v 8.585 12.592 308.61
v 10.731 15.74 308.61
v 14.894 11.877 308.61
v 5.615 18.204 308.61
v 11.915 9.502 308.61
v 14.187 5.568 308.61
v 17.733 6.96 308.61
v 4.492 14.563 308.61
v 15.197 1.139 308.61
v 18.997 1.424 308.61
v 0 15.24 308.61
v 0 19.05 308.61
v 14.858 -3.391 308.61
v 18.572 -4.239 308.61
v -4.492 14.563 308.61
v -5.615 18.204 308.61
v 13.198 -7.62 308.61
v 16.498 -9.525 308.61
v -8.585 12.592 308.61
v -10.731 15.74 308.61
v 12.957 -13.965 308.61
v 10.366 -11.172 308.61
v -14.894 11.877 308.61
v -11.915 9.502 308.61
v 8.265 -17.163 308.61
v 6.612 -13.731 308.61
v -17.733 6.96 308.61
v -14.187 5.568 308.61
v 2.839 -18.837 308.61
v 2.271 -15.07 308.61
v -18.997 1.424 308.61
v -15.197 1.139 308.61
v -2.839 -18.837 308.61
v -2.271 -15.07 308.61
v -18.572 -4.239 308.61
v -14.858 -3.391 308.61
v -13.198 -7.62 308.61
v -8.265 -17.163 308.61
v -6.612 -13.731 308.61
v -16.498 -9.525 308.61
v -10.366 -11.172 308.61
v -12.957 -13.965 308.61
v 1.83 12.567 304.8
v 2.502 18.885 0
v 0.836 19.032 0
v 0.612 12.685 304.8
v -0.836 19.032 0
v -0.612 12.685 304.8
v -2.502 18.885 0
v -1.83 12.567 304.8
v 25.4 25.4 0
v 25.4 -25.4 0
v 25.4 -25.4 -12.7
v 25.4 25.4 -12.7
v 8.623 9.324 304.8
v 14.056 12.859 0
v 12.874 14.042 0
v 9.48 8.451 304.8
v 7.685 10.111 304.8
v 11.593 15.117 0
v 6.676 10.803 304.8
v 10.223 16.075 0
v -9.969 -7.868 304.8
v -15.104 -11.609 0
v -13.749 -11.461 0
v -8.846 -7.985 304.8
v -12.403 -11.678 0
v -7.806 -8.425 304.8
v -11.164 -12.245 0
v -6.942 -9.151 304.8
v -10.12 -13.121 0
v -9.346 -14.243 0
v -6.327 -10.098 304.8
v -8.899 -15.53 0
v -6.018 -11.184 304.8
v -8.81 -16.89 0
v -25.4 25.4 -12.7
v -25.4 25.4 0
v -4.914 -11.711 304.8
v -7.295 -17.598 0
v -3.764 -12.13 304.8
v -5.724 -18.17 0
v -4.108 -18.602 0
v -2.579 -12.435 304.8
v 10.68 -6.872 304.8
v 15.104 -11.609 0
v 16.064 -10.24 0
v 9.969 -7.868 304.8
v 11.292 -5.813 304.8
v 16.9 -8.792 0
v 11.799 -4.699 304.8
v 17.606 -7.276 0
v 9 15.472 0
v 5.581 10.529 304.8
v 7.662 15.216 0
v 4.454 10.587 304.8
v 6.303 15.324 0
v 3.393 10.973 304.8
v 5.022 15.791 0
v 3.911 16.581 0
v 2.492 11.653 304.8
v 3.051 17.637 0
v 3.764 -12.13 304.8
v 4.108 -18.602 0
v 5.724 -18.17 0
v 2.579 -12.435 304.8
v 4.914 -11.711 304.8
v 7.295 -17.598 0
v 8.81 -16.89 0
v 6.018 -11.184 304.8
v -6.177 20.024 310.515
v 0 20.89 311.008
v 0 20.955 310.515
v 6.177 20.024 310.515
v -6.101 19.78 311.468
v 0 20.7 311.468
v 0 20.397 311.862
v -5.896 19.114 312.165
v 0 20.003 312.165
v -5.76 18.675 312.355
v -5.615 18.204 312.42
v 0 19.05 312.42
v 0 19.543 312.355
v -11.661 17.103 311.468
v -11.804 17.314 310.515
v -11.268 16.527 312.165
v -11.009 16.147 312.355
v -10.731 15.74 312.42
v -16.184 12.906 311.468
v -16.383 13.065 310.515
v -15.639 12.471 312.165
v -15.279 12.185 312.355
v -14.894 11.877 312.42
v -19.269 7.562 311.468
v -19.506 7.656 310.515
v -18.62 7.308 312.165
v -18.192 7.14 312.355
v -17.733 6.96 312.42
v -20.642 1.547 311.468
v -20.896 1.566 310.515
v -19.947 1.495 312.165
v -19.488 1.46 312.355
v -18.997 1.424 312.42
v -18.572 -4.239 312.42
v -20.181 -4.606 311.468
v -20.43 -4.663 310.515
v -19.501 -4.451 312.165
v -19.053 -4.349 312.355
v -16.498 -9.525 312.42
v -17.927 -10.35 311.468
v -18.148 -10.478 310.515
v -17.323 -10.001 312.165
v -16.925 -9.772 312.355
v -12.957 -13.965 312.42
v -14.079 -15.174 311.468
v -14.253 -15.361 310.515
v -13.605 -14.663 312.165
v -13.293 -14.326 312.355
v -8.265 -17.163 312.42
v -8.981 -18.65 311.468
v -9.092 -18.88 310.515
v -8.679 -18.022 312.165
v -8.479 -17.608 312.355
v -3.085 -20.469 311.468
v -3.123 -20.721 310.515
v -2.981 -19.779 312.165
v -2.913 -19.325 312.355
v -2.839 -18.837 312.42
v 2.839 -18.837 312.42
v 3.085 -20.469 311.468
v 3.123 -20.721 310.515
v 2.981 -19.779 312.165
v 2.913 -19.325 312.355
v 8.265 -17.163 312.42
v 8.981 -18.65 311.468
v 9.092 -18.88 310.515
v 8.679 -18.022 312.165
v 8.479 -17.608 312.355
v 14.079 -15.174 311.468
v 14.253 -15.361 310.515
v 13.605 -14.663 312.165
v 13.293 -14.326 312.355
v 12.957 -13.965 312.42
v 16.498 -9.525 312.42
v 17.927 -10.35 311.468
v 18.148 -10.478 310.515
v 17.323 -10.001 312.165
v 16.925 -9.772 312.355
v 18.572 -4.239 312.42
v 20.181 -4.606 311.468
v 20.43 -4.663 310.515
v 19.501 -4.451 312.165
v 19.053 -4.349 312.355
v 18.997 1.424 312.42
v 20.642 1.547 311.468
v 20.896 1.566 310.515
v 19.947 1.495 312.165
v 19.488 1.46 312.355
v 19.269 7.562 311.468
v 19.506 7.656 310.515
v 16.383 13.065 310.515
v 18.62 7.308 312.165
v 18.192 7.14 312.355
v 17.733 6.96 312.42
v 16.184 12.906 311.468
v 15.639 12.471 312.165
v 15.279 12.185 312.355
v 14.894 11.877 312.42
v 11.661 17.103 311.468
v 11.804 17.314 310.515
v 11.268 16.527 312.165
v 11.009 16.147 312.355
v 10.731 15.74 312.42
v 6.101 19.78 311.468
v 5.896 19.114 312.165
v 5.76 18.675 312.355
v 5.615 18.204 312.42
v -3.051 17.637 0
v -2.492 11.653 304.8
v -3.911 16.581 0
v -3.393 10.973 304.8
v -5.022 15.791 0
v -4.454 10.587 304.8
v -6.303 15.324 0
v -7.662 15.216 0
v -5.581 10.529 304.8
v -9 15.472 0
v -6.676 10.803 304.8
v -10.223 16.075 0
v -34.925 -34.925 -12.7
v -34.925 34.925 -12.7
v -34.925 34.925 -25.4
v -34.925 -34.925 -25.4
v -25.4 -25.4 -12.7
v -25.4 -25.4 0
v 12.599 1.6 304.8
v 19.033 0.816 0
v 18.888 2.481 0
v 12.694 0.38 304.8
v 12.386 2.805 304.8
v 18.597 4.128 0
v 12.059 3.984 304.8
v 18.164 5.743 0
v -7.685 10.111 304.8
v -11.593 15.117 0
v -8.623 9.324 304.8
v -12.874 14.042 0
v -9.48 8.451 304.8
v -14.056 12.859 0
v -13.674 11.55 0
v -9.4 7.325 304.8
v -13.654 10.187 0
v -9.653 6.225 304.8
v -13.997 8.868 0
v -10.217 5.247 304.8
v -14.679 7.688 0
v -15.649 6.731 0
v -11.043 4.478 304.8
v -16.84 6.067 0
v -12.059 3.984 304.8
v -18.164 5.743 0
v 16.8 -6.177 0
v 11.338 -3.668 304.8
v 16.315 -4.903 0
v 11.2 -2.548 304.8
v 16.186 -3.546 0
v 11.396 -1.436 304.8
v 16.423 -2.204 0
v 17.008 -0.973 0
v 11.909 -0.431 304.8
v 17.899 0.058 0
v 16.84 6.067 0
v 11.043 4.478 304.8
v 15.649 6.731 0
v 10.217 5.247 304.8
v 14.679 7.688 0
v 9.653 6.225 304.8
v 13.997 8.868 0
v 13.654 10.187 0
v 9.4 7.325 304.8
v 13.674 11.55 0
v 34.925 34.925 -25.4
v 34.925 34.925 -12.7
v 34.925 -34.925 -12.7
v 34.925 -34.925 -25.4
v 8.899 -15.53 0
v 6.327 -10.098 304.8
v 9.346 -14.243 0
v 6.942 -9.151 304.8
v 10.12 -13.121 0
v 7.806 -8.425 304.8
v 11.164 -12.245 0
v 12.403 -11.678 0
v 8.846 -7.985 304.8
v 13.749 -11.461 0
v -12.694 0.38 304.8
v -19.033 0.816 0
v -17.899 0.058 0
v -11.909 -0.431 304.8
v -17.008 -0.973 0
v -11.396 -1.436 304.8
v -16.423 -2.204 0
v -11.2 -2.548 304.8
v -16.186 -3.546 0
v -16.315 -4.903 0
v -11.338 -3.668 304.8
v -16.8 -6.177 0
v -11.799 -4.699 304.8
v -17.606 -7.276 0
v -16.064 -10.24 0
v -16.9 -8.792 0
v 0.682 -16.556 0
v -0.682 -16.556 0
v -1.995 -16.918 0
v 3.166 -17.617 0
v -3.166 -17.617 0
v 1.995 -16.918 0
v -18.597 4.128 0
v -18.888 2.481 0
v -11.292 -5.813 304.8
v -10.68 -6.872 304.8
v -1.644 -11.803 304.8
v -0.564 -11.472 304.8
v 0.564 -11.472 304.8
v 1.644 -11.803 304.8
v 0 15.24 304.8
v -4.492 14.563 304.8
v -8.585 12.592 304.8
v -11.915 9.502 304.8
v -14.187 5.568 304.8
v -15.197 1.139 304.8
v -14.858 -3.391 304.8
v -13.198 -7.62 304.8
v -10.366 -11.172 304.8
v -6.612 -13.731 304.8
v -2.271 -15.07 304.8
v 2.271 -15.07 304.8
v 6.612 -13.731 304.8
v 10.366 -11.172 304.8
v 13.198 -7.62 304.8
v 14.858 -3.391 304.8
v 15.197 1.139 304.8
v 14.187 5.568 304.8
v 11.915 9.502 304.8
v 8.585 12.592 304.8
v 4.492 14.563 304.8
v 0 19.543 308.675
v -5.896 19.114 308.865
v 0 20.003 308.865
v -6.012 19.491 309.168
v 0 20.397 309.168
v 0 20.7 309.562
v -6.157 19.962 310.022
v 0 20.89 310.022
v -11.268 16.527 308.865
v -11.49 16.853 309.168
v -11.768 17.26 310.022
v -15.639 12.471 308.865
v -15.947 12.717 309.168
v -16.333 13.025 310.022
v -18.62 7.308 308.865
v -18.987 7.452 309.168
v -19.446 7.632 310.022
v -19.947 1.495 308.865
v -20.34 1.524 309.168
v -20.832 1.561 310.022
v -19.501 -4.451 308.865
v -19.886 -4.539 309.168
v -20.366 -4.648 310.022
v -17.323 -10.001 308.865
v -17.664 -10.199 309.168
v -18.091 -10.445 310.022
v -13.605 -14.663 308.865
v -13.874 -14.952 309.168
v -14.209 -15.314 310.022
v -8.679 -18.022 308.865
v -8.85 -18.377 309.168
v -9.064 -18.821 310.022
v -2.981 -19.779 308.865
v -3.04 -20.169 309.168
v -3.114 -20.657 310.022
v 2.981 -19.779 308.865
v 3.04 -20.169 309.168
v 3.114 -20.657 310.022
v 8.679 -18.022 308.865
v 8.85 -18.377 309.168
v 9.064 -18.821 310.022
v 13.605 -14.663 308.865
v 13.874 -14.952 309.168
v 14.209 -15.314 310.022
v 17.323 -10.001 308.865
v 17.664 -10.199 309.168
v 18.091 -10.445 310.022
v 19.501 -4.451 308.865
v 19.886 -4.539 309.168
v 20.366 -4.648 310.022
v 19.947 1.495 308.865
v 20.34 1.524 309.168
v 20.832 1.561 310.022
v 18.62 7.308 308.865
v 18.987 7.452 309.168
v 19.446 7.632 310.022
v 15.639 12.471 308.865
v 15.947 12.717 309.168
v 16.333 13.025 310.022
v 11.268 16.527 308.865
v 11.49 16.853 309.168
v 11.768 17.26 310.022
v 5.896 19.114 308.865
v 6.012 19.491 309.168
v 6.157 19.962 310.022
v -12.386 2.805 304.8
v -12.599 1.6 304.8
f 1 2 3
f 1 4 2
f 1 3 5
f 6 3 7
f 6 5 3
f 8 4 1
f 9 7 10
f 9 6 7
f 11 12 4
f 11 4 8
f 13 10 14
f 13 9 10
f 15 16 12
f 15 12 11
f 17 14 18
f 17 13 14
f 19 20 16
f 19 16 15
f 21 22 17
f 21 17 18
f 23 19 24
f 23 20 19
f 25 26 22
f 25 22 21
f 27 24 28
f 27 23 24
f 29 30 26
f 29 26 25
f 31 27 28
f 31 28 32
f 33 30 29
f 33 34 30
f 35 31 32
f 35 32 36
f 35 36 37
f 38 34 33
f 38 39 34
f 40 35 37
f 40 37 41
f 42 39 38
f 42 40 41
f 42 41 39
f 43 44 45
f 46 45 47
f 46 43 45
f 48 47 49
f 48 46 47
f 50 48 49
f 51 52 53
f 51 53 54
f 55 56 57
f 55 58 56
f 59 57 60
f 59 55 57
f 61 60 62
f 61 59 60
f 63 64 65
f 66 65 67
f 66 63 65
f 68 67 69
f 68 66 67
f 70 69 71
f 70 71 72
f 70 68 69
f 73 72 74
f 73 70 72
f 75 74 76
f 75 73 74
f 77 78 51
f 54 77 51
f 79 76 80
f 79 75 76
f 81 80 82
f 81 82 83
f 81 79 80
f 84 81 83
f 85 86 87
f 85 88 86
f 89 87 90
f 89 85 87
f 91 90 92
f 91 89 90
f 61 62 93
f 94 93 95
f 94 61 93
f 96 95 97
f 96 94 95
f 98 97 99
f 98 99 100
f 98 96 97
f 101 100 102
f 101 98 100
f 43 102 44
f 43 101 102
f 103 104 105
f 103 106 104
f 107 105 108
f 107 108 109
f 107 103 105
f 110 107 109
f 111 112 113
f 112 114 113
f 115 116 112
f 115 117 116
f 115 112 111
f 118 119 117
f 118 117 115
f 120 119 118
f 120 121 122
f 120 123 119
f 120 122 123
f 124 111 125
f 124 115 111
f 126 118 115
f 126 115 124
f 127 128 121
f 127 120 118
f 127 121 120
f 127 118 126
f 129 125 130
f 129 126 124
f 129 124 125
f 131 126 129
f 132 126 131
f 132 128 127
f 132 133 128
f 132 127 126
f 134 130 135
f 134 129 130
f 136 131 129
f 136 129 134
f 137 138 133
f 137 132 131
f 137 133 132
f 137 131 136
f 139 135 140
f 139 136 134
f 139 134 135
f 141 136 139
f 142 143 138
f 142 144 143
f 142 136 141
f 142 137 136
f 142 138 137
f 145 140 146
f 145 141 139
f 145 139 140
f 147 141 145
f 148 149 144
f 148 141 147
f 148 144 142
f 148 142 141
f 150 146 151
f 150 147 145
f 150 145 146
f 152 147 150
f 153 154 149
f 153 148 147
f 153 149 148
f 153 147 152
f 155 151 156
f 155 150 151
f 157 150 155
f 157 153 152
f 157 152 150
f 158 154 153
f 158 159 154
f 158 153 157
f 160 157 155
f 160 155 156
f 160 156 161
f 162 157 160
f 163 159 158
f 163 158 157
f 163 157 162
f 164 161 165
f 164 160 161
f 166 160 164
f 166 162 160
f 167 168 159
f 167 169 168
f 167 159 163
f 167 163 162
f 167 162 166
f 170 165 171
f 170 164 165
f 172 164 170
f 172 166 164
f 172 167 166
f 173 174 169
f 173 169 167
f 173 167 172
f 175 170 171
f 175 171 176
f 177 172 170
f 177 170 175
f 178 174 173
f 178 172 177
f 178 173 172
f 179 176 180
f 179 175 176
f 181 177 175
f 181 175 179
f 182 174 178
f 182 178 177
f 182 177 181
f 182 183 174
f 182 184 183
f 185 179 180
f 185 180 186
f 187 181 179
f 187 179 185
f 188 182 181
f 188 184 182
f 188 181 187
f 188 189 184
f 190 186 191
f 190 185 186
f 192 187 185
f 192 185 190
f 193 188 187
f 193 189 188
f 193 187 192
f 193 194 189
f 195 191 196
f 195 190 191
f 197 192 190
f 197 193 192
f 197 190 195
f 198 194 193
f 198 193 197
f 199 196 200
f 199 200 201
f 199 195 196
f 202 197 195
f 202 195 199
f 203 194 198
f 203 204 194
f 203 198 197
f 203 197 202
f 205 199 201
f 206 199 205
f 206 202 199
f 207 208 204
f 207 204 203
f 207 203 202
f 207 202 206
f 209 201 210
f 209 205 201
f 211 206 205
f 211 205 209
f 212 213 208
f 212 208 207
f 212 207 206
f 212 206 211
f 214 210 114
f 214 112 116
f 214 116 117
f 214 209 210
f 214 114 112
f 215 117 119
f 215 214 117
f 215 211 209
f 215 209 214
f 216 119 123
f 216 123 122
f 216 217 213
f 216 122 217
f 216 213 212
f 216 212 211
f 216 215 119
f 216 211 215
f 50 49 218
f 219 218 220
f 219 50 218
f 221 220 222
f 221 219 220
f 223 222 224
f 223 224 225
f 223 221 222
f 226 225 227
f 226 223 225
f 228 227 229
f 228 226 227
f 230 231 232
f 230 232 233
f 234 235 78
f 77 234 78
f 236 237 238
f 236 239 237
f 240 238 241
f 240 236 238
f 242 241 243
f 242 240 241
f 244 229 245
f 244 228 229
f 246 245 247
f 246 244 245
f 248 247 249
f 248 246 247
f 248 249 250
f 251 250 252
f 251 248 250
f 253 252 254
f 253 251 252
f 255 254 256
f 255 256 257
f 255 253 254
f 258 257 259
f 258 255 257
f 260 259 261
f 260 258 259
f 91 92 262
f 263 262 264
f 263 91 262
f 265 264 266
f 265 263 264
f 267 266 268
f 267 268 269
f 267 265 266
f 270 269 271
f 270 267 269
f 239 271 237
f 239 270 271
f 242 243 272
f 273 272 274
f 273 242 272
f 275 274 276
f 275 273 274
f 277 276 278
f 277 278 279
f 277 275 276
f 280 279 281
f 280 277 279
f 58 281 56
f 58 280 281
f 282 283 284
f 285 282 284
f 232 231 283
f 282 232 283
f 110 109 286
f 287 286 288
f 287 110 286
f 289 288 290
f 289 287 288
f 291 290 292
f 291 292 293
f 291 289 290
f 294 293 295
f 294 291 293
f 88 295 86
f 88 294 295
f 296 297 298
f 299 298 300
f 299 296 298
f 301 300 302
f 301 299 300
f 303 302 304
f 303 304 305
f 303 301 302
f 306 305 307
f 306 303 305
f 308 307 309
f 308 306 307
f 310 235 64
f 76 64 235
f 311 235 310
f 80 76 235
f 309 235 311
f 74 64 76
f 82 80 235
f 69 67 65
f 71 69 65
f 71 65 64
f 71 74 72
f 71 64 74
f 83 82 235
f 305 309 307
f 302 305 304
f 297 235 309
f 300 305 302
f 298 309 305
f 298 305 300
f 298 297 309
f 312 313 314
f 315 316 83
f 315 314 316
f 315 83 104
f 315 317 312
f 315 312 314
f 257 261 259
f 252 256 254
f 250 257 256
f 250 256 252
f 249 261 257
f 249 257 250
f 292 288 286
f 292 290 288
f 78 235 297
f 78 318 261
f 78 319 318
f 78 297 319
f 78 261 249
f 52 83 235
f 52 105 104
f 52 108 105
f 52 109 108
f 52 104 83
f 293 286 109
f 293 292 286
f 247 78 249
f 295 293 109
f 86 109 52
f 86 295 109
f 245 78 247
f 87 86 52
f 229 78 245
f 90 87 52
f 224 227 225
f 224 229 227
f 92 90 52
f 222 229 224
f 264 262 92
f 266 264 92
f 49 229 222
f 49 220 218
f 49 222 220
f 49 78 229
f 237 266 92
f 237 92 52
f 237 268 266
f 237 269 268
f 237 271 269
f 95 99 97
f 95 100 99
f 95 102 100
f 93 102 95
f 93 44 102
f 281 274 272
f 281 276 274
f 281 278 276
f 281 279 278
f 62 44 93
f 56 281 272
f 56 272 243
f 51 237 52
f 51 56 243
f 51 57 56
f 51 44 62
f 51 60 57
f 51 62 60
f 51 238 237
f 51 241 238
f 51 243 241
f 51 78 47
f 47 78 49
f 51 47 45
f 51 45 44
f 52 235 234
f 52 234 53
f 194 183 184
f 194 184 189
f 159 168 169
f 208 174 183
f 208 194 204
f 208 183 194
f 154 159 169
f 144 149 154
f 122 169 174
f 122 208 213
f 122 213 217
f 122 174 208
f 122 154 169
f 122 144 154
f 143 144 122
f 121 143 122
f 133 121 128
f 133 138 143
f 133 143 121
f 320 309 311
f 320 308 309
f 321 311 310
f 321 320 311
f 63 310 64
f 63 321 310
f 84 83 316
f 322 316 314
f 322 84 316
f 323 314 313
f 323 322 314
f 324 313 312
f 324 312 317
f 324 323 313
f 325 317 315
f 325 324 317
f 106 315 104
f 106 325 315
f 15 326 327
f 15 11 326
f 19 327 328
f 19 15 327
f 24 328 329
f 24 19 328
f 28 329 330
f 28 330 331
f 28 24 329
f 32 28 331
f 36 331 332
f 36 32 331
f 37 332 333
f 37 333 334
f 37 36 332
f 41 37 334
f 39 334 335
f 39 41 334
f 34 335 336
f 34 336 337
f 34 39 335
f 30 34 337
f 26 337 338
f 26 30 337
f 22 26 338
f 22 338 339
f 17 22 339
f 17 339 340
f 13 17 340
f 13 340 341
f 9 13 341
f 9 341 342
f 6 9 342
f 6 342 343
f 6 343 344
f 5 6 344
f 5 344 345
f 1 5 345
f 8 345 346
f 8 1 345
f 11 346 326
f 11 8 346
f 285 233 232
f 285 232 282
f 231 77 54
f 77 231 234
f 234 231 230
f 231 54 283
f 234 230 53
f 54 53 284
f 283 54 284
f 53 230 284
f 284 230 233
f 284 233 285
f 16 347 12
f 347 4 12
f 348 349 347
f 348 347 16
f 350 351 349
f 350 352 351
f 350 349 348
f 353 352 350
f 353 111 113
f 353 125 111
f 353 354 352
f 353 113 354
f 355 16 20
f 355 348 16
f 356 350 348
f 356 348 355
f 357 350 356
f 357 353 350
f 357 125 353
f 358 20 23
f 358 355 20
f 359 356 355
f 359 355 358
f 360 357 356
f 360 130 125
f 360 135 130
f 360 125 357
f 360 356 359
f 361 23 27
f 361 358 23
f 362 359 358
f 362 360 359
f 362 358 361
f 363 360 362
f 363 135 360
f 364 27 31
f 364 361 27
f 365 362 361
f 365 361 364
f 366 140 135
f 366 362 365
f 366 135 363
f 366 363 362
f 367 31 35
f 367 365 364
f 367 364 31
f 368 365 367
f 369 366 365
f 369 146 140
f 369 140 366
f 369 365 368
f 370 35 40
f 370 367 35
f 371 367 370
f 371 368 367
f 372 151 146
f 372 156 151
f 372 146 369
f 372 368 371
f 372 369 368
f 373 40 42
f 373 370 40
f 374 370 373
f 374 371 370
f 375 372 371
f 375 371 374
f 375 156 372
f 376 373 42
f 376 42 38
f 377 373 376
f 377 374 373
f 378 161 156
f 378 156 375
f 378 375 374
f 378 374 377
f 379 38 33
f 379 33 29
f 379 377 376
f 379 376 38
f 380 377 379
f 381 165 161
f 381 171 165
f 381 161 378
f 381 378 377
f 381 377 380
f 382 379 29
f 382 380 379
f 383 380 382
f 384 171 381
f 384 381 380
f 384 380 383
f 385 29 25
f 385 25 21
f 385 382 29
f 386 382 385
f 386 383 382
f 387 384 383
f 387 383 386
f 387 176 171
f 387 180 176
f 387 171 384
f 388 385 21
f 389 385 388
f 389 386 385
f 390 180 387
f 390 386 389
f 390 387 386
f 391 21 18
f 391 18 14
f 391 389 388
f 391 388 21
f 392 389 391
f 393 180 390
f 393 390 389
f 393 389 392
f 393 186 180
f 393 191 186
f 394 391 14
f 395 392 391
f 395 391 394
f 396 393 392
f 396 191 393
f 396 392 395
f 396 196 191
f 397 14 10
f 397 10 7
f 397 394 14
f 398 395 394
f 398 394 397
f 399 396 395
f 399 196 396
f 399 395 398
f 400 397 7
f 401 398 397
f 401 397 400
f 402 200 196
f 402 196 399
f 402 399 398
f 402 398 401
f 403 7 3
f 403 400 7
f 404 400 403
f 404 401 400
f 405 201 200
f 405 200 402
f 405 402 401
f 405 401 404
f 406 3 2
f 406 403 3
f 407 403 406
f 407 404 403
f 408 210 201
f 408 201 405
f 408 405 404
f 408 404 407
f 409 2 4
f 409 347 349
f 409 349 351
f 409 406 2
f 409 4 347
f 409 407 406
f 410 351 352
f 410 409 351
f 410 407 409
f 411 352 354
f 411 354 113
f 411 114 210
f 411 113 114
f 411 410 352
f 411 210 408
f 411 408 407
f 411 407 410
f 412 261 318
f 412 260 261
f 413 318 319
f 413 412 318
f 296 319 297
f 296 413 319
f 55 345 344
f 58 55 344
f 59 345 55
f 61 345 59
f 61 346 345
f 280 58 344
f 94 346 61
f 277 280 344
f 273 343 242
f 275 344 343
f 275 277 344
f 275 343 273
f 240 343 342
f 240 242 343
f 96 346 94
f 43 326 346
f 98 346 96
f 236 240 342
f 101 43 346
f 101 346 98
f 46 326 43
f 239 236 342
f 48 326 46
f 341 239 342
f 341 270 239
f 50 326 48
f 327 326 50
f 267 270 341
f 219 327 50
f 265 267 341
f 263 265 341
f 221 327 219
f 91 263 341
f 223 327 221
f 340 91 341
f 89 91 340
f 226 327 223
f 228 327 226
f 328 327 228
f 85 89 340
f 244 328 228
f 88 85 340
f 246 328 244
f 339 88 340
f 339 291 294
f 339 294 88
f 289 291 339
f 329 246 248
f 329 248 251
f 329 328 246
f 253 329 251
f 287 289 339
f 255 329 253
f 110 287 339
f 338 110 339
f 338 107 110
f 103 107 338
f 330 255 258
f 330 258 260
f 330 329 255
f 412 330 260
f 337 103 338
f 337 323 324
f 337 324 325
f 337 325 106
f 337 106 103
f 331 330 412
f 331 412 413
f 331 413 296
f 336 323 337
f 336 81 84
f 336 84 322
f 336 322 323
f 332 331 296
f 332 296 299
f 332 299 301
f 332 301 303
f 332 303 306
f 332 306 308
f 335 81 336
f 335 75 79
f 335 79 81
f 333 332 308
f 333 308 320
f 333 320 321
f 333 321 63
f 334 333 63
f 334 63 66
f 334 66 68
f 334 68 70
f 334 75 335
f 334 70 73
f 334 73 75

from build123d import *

# Parameters (mm, degrees)
F6_W     = 50.8
F6_H     = 50.8
F7_DEPTH = 12.7
F8_W     = 69.85
F8_H     = 69.85
F8_W_2   = 50.8
F8_H_2   = 50.8
F9_DEPTH = 12.7


with BuildPart() as f3:
    # F0 (on Top) → F3 section 0
    with BuildSketch(Plane.XY):
        with BuildLine():
            ThreePointArc((17.6057903258, -7.2758949281), (16.2591760022, -2.8669314133), (19.0325338784, 0.815569843))
            ThreePointArc((19.0325338784, 0.815569843), (18.7605876949, 3.3079977846), (18.163672955, 5.7431250017))
            ThreePointArc((18.163672955, 5.7431250017), (14.2980794165, 8.255), (14.0555286261, 12.8586397042))
            ThreePointArc((14.0555286261, 12.8586397042), (12.2451039645, 14.5931466414), (10.2225711418, 16.0748729155))
            ThreePointArc((10.2225711418, 16.0748729155), (5.6467525663, 15.5143251692), (2.5017853198, 18.8850091399))
            ThreePointArc((2.5017853198, 18.8850091399), (0, 19.05), (-2.5017853198, 18.8850091399))
            ThreePointArc((-2.5017853198, 18.8850091399), (-5.6467525663, 15.5143251692), (-10.2225711418, 16.0748729155))
            ThreePointArc((-10.2225711418, 16.0748729155), (-12.2451039645, 14.5931466414), (-14.0555286261, 12.8586397042))
            ThreePointArc((-14.0555286261, 12.8586397042), (-14.2980794165, 8.255), (-18.163672955, 5.7431250017))
            ThreePointArc((-18.163672955, 5.7431250017), (-18.7605876949, 3.3079977846), (-19.0325338784, 0.815569843))
            ThreePointArc((-19.0325338784, 0.815569843), (-16.2591760022, -2.8669314133), (-17.6057903258, -7.2758949281))
            ThreePointArc((-17.6057903258, -7.2758949281), (-16.4977839421, -9.525), (-15.1040050059, -11.6091142117))
            ThreePointArc((-15.1040050059, -11.6091142117), (-10.6124234359, -12.6473937559), (-8.8099627366, -16.8904427586))
            ThreePointArc((-8.8099627366, -16.8904427586), (-6.5154837304, -17.901144426), (-4.1081443289, -18.6017647059))
            ThreePointArc((-4.1081443289, -18.6017647059), (0, -16.51), (4.1081443289, -18.6017647059))
            ThreePointArc((4.1081443289, -18.6017647059), (6.5154837304, -17.901144426), (8.8099627366, -16.8904427586))
            ThreePointArc((8.8099627366, -16.8904427586), (10.6124234359, -12.6473937559), (15.1040050059, -11.6091142117))
            ThreePointArc((15.1040050059, -11.6091142117), (16.4977839421, -9.525), (17.6057903258, -7.2758949281))
        make_face()
    # F2 (on offset) → F3 section 1
    with BuildSketch(Plane.XY.offset(304.8)):
        with BuildLine():
            ThreePointArc((11.7986839939, -4.6990484156), (11.2563526169, -1.9847986707), (12.6943054966, 0.3802735302))
            ThreePointArc((12.6943054966, 0.3802735302), (12.5070584633, 2.2053318564), (12.0588064085, 3.9843679552))
            ThreePointArc((12.0588064085, 3.9843679552), (9.8986703653, 5.715), (9.4799670714, 8.4510487115))
            ThreePointArc((9.4799670714, 8.4510487115), (8.163402643, 9.7287644276), (6.6764792859, 10.8034542784))
            ThreePointArc((6.6764792859, 10.8034542784), (3.9092902382, 10.7406866556), (1.8298466954, 12.5674842777))
            ThreePointArc((1.8298466954, 12.5674842777), (0, 12.7), (-1.8298466954, 12.5674842777))
            ThreePointArc((-1.8298466954, 12.5674842777), (-3.9092902382, 10.7406866556), (-6.6764792859, 10.8034542784))
            ThreePointArc((-6.6764792859, 10.8034542784), (-8.163402643, 9.7287644276), (-9.4799670714, 8.4510487115))
            ThreePointArc((-9.4799670714, 8.4510487115), (-9.8986703653, 5.715), (-12.0588064085, 3.9843679552))
            ThreePointArc((-12.0588064085, 3.9843679552), (-12.5070584633, 2.2053318564), (-12.6943054966, 0.3802735302))
            ThreePointArc((-12.6943054966, 0.3802735302), (-11.2563526169, -1.9847986707), (-11.7986839939, -4.6990484156))
            ThreePointArc((-11.7986839939, -4.6990484156), (-10.9985226281, -6.35), (-9.9688372985, -7.8684358621))
            ThreePointArc((-9.9688372985, -7.8684358621), (-7.3470623787, -8.7558879848), (-6.0178262108, -11.1837278086))
            ThreePointArc((-6.0178262108, -11.1837278086), (-4.3436558202, -11.934096284), (-2.5788393371, -12.4354166667))
            ThreePointArc((-2.5788393371, -12.4354166667), (0, -11.43), (2.5788393371, -12.4354166667))
            ThreePointArc((2.5788393371, -12.4354166667), (4.3436558202, -11.934096284), (6.0178262108, -11.1837278086))
            ThreePointArc((6.0178262108, -11.1837278086), (7.3470623787, -8.7558879848), (9.9688372985, -7.8684358621))
            ThreePointArc((9.9688372985, -7.8684358621), (10.9985226281, -6.35), (11.7986839939, -4.6990484156))
        make_face()
    loft()

    # F4 (on Right) → F5 (revolve)
    with BuildSketch(Plane.YZ):
        with BuildLine():
            Line((0, 312.42), (0, 304.8))
            Line((0, 304.8), (15.24, 304.8))
            Line((15.24, 304.8), (15.24, 308.61))
            Line((15.24, 308.61), (19.05, 308.61))
            ThreePointArc((19.05, 308.61), (17.145, 310.515), (19.05, 312.42))
            Line((19.05, 312.42), (0, 312.42))
        make_face()
        with BuildLine():
            Line((19.05, 308.61), (19.05, 312.42))
            ThreePointArc((19.05, 312.42), (17.145, 310.515), (19.05, 308.61))
        make_face()
        with BuildLine():
            ThreePointArc((20.955, 310.515), (20.3970384182, 311.8620384182), (19.05, 312.42))
            Line((19.05, 312.42), (19.05, 308.61))
            ThreePointArc((19.05, 308.61), (20.3970384182, 309.1679615818), (20.955, 310.515))
        make_face()
    revolve(axis=Axis((0, 0, 308.61), (0, 0, 1)))

    # F6 (on Top) → F7 (join)
    with BuildSketch(Plane.XY):
        Rectangle(F6_W, F6_H)
    extrude(amount=-F7_DEPTH)

    # F8 (on face) → F9 (join)
    with BuildSketch(Plane(origin=(0, 0, -12.7), x_dir=(1, 0, 0), z_dir=(0, 0, -1))):
        Rectangle(F8_W, F8_H)
        Rectangle(F8_W_2, F8_H_2, mode=Mode.SUBTRACT)
        Rectangle(F8_W_2, F8_H_2)
    extrude(amount=F9_DEPTH)


solid = f3.part
